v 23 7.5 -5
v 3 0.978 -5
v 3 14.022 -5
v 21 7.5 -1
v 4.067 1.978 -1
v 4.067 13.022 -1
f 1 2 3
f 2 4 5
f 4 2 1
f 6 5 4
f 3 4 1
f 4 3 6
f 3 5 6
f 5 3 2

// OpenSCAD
// file: rail.scad
module half_rail(width, height, angle) {
    polygon([
        [0, 0],
        [0, height],
        [width/2, height],
        [width/2 - tan(angle), 0]
    ]);
}

module rail(width, height, angle) {
    half_rail(width, height, angle);
    mirror([1,0]) half_rail(width, height, angle);
}
// file: notch.scad
include <rail.scad>

M = [ [ 1  , 0  , -0.5  , 0   ],
      [ 0  , 1  , 0  , 0   ],  // The "0.7" is the skew value; pushed along the y axis as z changes.
      [ 0  , 0  , 1  , 0   ],
      [ 0  , 0  , 0  , 1   ] ] ;

module notch(male = false, height=4) {
    intersection() {
        multmatrix(M) linear_extrude(height) scale([23, 15]) polygon([[0, 0], [1, 0.5], [0, 1]]);
        if (male) translate([3, 0, 0]) rotate([0, atan(1/3.75), 0]) cube([30, 20, 100]);
    }
}
// main file
include <notch.scad>

translate([0, 0, -5]) notch(male=true);
